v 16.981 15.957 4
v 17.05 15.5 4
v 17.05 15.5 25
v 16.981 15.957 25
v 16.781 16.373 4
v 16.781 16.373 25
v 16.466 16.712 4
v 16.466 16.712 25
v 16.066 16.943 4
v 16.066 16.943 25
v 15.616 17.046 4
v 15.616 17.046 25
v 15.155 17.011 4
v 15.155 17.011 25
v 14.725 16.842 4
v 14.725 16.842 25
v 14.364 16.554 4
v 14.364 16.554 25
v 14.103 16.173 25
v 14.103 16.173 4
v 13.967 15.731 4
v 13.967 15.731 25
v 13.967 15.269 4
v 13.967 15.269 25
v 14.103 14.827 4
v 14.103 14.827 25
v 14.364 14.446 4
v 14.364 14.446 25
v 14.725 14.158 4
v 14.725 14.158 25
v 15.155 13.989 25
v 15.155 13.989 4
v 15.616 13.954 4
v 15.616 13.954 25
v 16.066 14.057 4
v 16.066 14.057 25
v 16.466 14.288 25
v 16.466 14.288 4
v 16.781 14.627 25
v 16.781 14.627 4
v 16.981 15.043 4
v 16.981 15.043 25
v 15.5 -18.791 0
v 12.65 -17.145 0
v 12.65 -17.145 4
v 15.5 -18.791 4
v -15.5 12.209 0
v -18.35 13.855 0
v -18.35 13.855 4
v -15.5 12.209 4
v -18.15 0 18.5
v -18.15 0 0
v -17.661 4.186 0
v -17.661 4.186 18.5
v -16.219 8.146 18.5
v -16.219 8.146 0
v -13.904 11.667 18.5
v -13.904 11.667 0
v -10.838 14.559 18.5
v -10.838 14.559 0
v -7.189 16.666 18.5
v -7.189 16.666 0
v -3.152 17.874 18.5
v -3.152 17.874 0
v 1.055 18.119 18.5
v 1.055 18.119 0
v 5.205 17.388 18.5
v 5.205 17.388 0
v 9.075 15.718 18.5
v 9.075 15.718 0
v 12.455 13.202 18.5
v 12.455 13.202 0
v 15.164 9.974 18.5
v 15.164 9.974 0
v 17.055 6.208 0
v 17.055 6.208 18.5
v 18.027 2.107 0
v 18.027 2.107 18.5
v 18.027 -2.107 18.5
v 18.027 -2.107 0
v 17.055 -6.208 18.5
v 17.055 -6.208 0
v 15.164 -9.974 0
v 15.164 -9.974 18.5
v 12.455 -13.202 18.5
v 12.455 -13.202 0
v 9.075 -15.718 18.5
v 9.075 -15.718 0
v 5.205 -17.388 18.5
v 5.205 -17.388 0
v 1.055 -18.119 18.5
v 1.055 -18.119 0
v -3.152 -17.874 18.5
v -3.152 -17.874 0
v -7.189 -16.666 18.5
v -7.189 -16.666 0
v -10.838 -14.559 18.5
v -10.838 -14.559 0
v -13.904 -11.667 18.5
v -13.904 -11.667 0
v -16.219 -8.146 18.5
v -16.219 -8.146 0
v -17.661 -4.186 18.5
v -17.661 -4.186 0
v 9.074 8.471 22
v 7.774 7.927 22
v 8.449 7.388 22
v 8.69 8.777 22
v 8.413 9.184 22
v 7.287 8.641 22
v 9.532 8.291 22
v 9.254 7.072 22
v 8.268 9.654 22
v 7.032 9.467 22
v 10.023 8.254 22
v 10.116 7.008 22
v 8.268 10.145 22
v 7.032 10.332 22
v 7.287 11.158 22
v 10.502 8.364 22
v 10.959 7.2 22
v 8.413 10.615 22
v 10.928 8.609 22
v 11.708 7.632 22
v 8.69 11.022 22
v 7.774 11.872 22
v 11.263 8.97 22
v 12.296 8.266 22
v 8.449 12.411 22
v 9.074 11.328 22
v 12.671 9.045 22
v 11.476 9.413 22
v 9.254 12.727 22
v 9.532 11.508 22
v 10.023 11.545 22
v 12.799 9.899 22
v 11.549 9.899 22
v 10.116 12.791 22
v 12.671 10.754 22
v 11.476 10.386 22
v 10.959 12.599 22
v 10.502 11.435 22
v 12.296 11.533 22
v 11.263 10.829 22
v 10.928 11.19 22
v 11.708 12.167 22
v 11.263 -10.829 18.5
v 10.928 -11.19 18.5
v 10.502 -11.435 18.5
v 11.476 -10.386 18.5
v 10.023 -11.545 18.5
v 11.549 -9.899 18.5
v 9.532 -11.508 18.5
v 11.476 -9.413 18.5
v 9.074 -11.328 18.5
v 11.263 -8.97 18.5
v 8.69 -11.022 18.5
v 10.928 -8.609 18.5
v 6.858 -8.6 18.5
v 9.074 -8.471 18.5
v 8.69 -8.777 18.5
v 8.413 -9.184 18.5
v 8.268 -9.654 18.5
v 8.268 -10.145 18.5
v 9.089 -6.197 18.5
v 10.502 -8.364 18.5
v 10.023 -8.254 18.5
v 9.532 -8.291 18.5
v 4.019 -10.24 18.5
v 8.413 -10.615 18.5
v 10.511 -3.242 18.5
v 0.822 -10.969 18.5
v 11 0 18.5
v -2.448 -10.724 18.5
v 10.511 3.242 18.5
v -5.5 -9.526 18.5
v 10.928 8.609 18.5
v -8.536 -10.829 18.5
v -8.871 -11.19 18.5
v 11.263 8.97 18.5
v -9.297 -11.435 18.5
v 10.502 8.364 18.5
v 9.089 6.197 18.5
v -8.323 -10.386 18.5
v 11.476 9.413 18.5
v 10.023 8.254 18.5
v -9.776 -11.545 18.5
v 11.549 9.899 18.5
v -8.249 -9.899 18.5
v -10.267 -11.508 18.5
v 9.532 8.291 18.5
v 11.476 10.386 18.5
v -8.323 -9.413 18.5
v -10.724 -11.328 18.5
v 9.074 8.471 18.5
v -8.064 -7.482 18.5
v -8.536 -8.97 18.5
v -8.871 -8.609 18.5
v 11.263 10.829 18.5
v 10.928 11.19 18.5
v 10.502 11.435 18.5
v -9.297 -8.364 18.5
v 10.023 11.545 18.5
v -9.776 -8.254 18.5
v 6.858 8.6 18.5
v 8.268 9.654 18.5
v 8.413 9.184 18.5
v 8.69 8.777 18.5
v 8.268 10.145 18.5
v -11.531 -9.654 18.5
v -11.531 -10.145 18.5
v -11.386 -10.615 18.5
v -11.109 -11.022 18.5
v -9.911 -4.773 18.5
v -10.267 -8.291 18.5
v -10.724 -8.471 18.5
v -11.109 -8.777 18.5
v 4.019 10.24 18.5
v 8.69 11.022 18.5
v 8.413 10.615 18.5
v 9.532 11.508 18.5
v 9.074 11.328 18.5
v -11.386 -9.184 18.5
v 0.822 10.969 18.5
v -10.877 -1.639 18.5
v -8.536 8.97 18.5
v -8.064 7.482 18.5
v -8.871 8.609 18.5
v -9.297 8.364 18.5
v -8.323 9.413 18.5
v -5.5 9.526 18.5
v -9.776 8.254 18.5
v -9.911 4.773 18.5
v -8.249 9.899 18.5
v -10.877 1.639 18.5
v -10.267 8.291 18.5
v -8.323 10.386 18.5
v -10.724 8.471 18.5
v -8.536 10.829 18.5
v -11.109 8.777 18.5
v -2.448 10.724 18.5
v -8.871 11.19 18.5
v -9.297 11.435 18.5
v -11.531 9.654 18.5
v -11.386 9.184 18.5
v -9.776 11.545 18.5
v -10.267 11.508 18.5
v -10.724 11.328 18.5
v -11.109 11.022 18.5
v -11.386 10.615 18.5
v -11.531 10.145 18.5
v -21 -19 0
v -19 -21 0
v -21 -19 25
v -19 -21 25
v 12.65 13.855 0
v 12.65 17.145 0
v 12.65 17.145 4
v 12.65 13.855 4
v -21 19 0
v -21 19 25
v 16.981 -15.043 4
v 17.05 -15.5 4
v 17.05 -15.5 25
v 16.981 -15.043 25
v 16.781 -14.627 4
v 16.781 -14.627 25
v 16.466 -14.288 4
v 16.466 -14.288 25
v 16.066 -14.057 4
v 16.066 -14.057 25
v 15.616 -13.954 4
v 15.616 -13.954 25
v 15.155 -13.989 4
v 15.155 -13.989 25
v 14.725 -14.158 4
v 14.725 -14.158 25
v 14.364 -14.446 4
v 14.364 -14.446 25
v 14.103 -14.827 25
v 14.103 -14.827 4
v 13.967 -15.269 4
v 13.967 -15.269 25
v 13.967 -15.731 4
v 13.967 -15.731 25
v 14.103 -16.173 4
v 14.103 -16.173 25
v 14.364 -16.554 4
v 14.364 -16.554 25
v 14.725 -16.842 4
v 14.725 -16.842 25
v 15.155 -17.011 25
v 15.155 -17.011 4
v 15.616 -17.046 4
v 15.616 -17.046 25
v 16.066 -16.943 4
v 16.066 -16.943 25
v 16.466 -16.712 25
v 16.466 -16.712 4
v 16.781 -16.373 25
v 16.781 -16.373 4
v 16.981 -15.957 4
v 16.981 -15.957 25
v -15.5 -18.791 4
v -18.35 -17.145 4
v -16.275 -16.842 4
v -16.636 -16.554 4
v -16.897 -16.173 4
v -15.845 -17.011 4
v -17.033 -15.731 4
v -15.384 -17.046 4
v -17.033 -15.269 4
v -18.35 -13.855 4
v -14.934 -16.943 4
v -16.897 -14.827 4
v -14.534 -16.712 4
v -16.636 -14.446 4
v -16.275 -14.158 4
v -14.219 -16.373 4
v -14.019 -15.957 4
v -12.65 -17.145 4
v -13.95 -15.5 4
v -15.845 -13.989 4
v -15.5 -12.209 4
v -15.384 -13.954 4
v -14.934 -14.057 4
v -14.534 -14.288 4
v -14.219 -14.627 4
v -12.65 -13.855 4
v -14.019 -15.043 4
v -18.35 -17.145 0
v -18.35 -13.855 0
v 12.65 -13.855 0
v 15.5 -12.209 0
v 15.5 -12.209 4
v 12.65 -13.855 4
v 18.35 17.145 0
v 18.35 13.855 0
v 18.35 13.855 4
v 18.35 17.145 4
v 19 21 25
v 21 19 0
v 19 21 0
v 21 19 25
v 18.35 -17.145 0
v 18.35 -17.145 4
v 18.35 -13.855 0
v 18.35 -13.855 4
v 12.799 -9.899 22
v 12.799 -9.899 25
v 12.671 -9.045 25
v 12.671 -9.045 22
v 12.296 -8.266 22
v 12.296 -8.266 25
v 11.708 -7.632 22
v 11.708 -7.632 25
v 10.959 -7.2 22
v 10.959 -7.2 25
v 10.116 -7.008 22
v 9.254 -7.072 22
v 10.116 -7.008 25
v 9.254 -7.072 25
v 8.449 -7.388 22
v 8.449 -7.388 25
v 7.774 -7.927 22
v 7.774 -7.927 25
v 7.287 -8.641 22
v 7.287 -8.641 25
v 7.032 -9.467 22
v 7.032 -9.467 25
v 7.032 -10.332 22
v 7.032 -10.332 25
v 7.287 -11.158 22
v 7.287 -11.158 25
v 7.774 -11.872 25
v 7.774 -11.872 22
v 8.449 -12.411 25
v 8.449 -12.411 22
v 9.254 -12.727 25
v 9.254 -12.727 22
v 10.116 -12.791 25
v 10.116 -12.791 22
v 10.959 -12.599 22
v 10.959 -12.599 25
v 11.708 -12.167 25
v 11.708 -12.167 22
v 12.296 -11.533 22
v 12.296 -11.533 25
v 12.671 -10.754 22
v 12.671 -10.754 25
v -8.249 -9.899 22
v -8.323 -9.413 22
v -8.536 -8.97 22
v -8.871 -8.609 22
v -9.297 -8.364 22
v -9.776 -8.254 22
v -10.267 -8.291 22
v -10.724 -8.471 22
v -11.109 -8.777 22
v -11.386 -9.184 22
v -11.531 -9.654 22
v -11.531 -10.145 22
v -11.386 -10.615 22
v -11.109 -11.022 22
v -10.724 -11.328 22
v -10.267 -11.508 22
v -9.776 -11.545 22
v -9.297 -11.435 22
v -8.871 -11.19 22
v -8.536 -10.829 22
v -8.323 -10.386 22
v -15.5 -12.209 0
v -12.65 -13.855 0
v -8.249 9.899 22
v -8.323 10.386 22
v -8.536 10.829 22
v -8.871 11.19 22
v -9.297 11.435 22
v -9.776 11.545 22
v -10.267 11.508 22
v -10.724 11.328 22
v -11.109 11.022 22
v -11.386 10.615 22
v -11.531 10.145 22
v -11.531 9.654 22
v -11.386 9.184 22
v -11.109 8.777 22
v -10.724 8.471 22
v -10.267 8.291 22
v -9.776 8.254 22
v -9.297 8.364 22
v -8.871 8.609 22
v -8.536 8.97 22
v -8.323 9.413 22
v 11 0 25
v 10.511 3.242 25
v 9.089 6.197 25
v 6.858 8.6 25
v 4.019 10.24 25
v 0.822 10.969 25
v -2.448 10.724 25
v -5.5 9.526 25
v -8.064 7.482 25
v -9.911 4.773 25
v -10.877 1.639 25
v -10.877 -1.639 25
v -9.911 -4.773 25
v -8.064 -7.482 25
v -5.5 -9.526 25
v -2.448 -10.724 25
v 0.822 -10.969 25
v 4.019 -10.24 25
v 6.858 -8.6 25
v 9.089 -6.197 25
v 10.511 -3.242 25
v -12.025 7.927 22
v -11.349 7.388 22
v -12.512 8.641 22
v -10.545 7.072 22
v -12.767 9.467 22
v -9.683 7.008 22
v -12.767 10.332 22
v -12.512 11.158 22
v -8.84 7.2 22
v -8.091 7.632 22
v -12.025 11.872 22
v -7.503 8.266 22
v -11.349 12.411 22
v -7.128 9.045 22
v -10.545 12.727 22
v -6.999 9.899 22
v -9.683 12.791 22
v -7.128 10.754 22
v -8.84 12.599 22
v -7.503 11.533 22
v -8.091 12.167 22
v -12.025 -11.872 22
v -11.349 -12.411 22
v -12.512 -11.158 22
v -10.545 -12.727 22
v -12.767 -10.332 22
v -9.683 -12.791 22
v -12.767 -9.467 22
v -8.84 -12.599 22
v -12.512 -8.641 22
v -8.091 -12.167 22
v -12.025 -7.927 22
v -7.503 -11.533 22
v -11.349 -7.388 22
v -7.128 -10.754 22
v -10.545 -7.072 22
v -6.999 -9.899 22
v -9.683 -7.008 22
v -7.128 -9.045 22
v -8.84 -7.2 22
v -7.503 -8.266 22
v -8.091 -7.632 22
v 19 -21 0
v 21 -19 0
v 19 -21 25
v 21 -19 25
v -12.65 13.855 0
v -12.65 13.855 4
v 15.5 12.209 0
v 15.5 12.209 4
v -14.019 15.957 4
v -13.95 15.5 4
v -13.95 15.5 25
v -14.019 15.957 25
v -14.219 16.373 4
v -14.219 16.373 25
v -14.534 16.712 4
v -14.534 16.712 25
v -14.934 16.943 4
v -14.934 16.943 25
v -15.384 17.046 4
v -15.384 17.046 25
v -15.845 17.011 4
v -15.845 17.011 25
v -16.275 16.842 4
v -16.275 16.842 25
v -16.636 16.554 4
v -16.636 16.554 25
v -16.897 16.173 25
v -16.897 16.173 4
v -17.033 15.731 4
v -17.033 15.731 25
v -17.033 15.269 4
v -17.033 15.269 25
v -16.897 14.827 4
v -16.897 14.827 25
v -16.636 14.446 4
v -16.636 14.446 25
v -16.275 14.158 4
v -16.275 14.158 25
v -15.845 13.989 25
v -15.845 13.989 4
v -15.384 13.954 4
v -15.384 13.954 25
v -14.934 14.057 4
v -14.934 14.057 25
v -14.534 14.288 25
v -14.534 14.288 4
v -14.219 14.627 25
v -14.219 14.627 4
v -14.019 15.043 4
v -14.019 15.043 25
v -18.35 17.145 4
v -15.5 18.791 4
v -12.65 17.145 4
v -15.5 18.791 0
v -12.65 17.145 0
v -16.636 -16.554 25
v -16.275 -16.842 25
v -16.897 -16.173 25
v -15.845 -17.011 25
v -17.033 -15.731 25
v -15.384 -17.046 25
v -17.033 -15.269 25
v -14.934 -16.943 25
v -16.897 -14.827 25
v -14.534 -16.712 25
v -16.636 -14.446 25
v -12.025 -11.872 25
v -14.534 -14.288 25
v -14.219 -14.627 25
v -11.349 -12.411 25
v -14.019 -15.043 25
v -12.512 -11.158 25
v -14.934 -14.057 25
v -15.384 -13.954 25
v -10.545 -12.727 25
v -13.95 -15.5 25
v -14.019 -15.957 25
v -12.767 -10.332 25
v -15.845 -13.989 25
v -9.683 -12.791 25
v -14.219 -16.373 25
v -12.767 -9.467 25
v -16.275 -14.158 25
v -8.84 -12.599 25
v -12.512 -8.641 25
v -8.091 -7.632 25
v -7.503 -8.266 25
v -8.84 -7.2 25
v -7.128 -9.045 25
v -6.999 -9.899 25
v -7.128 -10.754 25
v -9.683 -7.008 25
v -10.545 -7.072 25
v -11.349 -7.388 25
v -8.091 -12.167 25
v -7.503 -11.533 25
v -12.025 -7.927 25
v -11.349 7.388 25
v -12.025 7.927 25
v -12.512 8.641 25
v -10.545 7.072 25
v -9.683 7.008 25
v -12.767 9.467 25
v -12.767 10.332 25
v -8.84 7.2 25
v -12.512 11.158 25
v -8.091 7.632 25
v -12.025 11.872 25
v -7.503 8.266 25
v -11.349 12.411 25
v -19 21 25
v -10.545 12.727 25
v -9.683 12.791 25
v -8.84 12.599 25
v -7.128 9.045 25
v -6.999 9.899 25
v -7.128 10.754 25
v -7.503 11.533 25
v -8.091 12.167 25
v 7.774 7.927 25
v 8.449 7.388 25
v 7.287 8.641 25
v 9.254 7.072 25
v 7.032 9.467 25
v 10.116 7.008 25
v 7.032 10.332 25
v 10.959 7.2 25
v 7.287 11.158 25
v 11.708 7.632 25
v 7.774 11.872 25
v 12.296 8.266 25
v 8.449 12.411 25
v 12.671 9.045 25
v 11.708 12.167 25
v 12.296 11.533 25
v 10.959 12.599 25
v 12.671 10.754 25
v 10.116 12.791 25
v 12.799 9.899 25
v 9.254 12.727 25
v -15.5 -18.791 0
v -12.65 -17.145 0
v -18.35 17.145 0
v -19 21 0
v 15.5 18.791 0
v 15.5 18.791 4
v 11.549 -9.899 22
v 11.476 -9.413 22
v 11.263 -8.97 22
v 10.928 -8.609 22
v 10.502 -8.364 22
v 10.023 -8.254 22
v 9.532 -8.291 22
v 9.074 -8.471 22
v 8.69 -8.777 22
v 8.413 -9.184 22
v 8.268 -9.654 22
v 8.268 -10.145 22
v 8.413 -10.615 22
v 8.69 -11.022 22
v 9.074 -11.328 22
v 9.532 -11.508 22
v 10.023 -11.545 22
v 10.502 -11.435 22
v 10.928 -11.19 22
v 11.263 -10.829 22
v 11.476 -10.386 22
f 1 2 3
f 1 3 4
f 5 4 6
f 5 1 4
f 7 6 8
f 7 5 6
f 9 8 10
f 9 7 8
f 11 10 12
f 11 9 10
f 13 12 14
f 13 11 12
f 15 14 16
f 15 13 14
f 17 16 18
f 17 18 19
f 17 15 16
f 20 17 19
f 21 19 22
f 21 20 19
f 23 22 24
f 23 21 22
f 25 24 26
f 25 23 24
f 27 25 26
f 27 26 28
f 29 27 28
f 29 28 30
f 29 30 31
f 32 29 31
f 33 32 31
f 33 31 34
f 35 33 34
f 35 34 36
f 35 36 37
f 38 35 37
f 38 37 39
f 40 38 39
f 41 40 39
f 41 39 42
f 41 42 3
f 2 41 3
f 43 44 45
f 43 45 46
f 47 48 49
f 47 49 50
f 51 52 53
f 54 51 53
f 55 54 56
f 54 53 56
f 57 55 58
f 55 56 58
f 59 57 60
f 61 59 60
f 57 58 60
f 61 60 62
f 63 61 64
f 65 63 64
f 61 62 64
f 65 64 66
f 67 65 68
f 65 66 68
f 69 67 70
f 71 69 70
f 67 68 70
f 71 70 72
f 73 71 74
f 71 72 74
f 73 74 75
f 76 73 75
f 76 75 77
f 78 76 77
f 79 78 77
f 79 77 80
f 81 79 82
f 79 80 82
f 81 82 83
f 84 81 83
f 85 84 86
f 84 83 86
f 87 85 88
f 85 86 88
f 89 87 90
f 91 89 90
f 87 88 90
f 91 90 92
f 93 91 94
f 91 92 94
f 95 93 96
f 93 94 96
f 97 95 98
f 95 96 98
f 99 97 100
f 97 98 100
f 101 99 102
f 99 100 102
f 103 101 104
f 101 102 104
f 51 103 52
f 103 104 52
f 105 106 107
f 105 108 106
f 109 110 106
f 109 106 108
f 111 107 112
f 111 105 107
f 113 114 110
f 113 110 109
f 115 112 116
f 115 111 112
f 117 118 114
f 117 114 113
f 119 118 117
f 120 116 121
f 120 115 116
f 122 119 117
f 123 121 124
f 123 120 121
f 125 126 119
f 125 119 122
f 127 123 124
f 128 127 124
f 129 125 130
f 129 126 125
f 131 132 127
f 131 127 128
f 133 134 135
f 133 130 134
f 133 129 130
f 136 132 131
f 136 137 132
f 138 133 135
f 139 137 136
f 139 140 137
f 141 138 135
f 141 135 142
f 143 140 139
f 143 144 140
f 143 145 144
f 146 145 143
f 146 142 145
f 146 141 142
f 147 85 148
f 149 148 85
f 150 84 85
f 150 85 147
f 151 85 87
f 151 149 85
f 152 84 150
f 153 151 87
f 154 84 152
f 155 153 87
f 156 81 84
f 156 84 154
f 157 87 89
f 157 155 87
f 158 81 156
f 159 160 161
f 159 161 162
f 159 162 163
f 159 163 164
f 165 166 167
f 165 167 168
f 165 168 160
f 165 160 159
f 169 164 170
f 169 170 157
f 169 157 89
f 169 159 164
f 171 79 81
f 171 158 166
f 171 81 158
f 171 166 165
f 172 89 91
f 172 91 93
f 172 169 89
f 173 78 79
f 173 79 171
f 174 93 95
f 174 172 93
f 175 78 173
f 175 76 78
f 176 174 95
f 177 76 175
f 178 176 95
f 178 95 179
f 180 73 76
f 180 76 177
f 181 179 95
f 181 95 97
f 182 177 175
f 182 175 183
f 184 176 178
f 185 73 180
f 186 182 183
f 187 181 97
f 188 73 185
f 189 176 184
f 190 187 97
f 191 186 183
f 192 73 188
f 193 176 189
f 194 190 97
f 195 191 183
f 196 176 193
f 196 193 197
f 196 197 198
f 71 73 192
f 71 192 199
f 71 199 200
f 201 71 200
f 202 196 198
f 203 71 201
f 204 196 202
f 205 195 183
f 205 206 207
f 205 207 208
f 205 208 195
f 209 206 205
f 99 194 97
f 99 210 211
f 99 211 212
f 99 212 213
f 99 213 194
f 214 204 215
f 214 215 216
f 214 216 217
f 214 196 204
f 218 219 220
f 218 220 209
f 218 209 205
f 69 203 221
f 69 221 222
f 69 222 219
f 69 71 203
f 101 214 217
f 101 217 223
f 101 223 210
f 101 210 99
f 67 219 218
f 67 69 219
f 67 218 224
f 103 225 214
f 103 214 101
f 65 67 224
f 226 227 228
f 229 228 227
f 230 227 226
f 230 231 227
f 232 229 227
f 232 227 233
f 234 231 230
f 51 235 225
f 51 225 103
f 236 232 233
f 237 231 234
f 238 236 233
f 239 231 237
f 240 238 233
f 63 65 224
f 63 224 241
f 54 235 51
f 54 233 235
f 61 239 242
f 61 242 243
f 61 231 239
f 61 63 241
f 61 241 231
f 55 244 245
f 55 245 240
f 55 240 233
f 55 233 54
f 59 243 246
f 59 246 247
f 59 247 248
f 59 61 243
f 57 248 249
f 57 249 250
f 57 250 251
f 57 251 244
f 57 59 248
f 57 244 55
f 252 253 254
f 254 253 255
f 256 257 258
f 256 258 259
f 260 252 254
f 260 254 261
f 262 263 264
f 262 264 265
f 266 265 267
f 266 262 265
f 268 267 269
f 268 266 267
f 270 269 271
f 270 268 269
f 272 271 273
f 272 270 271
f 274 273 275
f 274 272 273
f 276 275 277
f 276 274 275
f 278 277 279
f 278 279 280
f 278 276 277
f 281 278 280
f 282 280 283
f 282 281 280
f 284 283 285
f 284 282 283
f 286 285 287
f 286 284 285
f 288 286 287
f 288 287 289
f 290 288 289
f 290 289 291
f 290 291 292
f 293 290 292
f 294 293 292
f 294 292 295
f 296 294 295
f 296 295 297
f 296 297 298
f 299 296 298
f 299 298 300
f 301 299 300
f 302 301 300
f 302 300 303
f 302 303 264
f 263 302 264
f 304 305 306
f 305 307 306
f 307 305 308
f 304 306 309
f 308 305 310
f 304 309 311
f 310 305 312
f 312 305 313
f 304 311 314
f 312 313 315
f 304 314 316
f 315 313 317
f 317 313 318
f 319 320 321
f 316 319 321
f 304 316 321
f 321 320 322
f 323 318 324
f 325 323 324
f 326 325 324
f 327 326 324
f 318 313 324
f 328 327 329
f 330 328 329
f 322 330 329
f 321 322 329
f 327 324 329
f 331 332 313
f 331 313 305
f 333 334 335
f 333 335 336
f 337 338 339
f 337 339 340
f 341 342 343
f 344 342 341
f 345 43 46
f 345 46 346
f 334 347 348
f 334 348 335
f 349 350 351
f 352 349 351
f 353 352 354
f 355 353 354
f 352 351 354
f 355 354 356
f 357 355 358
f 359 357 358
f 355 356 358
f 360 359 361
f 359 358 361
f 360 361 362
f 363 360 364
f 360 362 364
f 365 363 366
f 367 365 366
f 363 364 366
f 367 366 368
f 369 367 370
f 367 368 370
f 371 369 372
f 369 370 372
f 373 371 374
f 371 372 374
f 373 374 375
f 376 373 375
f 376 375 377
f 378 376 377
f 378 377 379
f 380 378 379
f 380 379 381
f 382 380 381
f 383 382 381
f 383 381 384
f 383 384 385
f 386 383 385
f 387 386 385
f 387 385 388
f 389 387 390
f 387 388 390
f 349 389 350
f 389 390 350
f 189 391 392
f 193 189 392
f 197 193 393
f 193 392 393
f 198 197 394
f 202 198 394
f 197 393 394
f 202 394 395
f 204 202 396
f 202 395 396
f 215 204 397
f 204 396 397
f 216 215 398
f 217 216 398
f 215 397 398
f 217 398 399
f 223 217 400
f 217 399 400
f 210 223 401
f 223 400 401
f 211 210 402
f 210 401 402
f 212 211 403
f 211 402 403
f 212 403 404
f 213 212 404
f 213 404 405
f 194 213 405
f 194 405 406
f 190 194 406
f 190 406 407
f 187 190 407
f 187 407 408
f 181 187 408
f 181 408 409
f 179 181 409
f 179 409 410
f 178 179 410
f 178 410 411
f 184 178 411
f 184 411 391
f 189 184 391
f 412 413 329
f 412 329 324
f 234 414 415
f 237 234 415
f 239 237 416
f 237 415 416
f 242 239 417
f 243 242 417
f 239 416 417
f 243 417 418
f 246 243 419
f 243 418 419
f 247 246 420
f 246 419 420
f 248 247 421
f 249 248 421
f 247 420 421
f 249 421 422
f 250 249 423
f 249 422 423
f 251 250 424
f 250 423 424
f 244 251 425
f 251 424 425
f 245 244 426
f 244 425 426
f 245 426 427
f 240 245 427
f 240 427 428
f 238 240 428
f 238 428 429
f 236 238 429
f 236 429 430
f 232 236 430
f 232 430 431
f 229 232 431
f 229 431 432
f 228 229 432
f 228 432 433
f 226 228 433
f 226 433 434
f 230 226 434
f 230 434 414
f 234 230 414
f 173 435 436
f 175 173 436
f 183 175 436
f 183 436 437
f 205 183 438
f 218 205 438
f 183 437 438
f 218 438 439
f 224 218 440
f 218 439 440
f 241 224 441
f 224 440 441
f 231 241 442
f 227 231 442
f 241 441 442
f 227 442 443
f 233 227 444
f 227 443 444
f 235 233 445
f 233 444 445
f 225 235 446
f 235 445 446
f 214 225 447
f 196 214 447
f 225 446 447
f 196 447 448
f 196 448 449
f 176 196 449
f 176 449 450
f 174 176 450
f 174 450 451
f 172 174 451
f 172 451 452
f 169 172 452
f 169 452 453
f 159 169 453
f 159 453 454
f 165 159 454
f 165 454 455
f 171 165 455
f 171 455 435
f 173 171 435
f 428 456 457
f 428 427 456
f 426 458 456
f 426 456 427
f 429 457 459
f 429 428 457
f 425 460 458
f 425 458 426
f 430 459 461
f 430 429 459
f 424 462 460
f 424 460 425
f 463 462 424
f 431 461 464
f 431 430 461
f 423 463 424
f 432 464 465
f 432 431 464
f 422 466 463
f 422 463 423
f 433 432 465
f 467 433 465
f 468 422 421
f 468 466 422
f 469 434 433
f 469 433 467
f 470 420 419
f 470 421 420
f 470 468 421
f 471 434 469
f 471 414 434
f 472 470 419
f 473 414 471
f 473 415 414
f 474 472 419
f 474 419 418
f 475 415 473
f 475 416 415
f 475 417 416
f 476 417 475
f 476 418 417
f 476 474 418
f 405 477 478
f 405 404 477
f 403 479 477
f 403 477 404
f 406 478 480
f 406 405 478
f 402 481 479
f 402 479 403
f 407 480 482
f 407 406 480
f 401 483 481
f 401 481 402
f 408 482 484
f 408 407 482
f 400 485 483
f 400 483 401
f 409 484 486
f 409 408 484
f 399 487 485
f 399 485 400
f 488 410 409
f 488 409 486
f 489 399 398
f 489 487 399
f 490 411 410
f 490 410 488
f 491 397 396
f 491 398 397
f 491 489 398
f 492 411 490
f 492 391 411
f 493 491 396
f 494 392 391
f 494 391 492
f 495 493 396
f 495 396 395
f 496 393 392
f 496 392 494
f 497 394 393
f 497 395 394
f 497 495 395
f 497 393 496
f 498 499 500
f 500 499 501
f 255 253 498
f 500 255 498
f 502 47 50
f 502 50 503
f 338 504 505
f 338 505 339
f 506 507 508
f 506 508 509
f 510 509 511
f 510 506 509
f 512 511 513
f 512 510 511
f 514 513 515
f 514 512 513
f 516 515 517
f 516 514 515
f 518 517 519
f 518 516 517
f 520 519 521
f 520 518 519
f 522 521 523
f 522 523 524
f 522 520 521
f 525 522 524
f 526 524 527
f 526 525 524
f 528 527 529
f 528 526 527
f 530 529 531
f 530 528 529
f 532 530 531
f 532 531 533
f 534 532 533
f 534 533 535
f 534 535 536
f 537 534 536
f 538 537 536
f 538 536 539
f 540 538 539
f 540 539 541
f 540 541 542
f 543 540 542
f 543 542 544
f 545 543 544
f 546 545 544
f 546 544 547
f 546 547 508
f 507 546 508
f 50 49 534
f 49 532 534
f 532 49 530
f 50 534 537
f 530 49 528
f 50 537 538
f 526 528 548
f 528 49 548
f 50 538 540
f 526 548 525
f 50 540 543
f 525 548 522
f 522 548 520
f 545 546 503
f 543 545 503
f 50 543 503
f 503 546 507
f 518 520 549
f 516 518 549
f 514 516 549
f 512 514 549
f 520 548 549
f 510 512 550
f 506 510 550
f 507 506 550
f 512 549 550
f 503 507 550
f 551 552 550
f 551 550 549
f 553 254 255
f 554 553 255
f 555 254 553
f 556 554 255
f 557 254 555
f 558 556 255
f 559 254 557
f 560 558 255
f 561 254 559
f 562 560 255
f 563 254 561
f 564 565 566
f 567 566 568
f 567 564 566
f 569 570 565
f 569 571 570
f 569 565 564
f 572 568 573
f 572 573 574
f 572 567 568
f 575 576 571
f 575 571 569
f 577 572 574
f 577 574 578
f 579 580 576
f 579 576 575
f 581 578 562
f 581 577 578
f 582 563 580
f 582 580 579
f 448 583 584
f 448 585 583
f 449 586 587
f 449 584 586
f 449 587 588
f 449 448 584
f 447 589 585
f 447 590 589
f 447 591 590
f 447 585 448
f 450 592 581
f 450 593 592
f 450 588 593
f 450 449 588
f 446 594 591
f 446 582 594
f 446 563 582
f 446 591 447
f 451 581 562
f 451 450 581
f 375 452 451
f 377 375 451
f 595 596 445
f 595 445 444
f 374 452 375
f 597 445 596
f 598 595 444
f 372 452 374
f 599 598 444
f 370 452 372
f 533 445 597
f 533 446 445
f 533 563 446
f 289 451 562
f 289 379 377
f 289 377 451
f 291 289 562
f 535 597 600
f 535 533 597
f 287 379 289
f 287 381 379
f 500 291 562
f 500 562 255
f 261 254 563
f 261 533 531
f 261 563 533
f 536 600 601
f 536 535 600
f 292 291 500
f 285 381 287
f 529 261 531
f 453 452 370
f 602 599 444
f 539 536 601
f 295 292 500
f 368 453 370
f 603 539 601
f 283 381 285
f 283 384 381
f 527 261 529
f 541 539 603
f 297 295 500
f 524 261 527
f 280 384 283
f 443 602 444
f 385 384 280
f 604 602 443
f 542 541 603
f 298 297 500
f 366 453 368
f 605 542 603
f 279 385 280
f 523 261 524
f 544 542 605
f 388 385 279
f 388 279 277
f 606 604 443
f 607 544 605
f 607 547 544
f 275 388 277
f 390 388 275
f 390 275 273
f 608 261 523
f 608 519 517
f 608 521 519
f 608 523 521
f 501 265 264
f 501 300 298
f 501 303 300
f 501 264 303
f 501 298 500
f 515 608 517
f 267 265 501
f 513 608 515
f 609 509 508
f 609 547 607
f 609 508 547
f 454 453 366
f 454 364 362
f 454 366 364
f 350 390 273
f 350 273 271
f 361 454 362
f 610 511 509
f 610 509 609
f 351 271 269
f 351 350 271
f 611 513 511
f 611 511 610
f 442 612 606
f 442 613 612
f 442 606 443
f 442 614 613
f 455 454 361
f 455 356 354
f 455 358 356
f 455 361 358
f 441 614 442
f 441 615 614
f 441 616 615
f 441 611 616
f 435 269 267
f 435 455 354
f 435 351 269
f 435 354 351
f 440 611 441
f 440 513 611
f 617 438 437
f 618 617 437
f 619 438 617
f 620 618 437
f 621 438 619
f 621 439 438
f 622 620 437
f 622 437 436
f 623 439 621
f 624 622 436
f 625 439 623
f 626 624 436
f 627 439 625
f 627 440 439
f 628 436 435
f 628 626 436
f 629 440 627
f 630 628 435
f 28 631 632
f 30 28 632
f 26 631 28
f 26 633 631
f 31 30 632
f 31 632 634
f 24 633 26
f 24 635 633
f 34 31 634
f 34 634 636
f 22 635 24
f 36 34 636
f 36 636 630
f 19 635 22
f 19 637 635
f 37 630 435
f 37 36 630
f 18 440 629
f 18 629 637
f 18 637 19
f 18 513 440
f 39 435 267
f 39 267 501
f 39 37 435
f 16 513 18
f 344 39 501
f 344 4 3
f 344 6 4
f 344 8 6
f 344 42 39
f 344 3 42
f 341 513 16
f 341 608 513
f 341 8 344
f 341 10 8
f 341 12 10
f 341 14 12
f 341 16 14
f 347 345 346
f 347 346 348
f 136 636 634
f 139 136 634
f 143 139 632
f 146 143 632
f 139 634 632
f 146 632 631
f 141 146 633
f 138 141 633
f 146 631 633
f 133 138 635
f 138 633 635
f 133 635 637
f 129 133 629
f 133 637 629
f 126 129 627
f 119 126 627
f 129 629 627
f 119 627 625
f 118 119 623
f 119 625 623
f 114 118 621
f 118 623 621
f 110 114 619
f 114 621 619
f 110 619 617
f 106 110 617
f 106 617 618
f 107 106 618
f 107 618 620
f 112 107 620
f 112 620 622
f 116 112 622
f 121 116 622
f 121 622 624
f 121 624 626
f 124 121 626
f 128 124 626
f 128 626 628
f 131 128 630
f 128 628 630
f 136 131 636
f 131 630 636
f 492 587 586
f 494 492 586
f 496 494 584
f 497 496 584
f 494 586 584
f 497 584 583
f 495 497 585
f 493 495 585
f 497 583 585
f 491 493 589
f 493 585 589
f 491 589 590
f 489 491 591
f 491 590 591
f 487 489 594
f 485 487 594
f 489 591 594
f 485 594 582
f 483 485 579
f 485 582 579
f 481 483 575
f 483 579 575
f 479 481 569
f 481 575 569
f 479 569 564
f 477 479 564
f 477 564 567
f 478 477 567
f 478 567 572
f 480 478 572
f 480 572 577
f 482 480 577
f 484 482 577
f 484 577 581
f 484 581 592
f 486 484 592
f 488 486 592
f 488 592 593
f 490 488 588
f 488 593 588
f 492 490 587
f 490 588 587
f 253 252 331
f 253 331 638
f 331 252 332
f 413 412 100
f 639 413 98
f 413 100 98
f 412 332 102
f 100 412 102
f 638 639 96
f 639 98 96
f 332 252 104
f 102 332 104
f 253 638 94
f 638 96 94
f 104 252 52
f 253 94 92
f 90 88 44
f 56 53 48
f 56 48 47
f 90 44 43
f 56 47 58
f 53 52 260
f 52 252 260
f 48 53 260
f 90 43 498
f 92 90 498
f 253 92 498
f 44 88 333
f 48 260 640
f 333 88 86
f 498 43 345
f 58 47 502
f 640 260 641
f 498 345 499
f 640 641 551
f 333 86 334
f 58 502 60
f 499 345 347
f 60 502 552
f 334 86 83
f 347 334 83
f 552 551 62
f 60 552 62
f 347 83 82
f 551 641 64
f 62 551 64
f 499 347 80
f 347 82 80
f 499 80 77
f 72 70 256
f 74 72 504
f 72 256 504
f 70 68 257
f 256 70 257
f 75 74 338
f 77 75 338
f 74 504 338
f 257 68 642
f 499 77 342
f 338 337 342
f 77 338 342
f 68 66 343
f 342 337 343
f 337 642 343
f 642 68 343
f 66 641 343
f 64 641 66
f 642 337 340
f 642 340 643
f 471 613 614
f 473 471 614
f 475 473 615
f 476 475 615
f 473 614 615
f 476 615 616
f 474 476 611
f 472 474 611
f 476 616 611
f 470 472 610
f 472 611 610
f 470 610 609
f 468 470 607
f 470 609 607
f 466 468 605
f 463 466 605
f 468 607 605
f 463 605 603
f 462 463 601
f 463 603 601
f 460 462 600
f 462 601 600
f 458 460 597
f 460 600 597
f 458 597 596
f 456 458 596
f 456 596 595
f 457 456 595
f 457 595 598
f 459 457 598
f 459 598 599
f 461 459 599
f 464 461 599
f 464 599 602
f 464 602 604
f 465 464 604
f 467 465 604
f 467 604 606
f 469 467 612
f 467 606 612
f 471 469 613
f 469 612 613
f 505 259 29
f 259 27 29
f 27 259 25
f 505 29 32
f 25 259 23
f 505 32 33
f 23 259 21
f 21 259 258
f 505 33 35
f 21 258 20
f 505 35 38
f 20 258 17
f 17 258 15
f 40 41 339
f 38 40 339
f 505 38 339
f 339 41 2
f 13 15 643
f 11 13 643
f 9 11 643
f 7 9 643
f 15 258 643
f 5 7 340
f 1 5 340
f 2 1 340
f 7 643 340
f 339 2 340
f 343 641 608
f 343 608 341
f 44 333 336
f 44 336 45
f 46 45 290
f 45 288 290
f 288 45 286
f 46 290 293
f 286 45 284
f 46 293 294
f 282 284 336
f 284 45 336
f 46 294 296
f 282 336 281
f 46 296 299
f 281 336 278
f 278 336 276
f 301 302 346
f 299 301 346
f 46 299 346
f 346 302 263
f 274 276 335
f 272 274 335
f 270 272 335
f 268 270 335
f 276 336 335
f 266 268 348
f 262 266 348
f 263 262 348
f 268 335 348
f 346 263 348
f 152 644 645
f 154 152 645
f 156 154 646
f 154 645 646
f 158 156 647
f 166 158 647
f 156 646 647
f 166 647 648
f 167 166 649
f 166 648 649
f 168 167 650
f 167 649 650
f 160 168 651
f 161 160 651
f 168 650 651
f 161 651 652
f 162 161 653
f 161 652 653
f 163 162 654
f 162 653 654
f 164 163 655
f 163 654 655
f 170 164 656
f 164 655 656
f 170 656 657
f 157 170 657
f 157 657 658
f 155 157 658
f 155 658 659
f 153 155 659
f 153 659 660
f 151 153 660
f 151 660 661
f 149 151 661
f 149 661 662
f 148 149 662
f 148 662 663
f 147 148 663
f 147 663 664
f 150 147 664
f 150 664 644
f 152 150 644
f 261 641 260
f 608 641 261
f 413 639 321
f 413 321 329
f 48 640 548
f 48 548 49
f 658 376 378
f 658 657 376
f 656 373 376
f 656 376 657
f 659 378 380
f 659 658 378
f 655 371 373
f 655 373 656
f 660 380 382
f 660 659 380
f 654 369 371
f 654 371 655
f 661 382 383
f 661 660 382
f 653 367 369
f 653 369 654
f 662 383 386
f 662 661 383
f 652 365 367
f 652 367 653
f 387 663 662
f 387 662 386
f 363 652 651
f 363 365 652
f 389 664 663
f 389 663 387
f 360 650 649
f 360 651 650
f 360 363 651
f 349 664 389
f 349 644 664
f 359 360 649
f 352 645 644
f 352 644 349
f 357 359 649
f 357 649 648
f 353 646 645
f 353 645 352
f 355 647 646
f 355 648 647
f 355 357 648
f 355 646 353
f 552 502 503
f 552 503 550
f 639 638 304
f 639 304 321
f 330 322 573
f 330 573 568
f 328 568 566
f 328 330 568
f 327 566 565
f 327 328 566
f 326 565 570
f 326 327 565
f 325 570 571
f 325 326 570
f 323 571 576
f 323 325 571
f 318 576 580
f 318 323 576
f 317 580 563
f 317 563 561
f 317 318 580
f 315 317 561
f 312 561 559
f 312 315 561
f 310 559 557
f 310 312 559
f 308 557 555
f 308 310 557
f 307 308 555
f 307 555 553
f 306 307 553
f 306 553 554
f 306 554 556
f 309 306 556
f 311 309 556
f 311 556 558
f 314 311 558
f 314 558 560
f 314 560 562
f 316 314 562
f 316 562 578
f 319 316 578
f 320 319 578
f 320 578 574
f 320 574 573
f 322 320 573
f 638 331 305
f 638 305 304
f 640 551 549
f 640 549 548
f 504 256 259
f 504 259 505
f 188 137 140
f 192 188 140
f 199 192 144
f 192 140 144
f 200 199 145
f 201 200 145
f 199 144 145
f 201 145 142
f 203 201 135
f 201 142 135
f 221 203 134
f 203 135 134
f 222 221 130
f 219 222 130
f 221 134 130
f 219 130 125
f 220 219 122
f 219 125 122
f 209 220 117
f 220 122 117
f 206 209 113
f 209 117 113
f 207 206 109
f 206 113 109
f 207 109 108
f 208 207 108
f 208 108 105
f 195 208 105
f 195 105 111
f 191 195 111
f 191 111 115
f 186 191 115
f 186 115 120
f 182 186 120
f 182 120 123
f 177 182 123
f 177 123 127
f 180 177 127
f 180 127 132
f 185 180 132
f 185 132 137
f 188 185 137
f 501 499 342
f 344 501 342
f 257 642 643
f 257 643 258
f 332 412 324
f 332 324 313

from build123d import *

# Parameters (mm, degrees)
SKETCH1_W           = 42
SKETCH1_H           = 42
SKETCH1_R           = 1.55
BOSS_EXTRUDE1_DEPTH = 25
SKETCH2_R           = 1.65
SKETCH2_R_2         = 11
CUT_EXTRUDE1_DEPTH  = 25
SKETCH3_R           = 2.9
CUT_EXTRUDE2_DEPTH  = 3
CHAMFER1_SIZE       = 2
SKETCH4_R           = 18.15
CUT_EXTRUDE3_DEPTH  = 18.5
CUT_EXTRUDE_1_DEPTH = 4


with BuildPart() as part:
    # Sketch1 → Boss-Extrude1 (new body)
    with BuildSketch(Plane.XY):
        Rectangle(SKETCH1_W, SKETCH1_H)
        with Locations((-15.5, 15.5)):
            Circle(SKETCH1_R, mode=Mode.SUBTRACT)
        with Locations((15.5, 15.5)):
            Circle(SKETCH1_R, mode=Mode.SUBTRACT)
        with Locations((15.5, -15.5)):
            Circle(SKETCH1_R, mode=Mode.SUBTRACT)
        with Locations((-15.5, -15.5)):
            Circle(SKETCH1_R, mode=Mode.SUBTRACT)
    extrude(amount=BOSS_EXTRUDE1_DEPTH)

    # Sketch2 → Cut-Extrude1 (cut)
    with BuildSketch(Plane.XY.offset(25)):
        with Locations((9.899494937, 9.899494937)):
            Circle(SKETCH2_R)
        with Locations((9.899494937, -9.899494937)):
            Circle(SKETCH2_R)
        with Locations((-9.899494937, -9.899494937)):
            Circle(SKETCH2_R)
        with Locations((-9.899494937, 9.899494937)):
            Circle(SKETCH2_R)
        Circle(SKETCH2_R_2)
    extrude(amount=-CUT_EXTRUDE1_DEPTH, mode=Mode.SUBTRACT)

    # Sketch3 → Cut-Extrude2 (cut)
    with BuildSketch(Plane.XY.offset(25)):
        with Locations((9.899494937, 9.899494937)):
            Circle(SKETCH3_R)
        with Locations((9.899494937, -9.899494937)):
            Circle(SKETCH3_R)
        with Locations((-9.899494937, -9.899494937)):
            Circle(SKETCH3_R)
        with Locations((-9.899494937, 9.899494937)):
            Circle(SKETCH3_R)
    extrude(amount=-CUT_EXTRUDE2_DEPTH, mode=Mode.SUBTRACT)

    # Chamfer1
    chamfer1_edges = [part.edges().sort_by_distance(p)[0] for p in [
        (21, -21, 12.5),
        (-21, -21, 12.5),
        (-21, 21, 12.5),
        (21, 21, 12.5),
    ]]
    chamfer(chamfer1_edges, length=CHAMFER1_SIZE)

    # Sketch4 → Cut-Extrude3 (cut)
    with BuildSketch(Plane(origin=(0, 0, 0), x_dir=(-1, 0, 0), z_dir=(0, 0, -1))):
        Circle(SKETCH4_R)
    extrude(amount=-CUT_EXTRUDE3_DEPTH, mode=Mode.SUBTRACT)

    # 草图1 → 切除-拉伸1 (cut)
    with BuildSketch(Plane.XY):
        Polygon((-15.5, 12.209103466), (-12.65, 13.854551733), (-12.65, 17.145448267), (-15.5, 18.790896534), (-18.35, 17.145448267), (-18.35, 13.854551733), align=None)
        Polygon((15.5, -12.209103466), (12.65, -13.854551733), (12.65, -17.145448267), (15.5, -18.790896534), (18.35, -17.145448267), (18.35, -13.854551733), align=None)
        Polygon((15.5, 18.790896534), (12.65, 17.145448267), (12.65, 13.854551733), (15.5, 12.209103466), (18.35, 13.854551733), (18.35, 17.145448267), align=None)
        Polygon((-15.5, -12.209103466), (-18.35, -13.854551733), (-18.35, -17.145448267), (-15.5, -18.790896534), (-12.65, -17.145448267), (-12.65, -13.854551733), align=None)
    extrude(amount=CUT_EXTRUDE_1_DEPTH, mode=Mode.SUBTRACT)


solid = part.part
